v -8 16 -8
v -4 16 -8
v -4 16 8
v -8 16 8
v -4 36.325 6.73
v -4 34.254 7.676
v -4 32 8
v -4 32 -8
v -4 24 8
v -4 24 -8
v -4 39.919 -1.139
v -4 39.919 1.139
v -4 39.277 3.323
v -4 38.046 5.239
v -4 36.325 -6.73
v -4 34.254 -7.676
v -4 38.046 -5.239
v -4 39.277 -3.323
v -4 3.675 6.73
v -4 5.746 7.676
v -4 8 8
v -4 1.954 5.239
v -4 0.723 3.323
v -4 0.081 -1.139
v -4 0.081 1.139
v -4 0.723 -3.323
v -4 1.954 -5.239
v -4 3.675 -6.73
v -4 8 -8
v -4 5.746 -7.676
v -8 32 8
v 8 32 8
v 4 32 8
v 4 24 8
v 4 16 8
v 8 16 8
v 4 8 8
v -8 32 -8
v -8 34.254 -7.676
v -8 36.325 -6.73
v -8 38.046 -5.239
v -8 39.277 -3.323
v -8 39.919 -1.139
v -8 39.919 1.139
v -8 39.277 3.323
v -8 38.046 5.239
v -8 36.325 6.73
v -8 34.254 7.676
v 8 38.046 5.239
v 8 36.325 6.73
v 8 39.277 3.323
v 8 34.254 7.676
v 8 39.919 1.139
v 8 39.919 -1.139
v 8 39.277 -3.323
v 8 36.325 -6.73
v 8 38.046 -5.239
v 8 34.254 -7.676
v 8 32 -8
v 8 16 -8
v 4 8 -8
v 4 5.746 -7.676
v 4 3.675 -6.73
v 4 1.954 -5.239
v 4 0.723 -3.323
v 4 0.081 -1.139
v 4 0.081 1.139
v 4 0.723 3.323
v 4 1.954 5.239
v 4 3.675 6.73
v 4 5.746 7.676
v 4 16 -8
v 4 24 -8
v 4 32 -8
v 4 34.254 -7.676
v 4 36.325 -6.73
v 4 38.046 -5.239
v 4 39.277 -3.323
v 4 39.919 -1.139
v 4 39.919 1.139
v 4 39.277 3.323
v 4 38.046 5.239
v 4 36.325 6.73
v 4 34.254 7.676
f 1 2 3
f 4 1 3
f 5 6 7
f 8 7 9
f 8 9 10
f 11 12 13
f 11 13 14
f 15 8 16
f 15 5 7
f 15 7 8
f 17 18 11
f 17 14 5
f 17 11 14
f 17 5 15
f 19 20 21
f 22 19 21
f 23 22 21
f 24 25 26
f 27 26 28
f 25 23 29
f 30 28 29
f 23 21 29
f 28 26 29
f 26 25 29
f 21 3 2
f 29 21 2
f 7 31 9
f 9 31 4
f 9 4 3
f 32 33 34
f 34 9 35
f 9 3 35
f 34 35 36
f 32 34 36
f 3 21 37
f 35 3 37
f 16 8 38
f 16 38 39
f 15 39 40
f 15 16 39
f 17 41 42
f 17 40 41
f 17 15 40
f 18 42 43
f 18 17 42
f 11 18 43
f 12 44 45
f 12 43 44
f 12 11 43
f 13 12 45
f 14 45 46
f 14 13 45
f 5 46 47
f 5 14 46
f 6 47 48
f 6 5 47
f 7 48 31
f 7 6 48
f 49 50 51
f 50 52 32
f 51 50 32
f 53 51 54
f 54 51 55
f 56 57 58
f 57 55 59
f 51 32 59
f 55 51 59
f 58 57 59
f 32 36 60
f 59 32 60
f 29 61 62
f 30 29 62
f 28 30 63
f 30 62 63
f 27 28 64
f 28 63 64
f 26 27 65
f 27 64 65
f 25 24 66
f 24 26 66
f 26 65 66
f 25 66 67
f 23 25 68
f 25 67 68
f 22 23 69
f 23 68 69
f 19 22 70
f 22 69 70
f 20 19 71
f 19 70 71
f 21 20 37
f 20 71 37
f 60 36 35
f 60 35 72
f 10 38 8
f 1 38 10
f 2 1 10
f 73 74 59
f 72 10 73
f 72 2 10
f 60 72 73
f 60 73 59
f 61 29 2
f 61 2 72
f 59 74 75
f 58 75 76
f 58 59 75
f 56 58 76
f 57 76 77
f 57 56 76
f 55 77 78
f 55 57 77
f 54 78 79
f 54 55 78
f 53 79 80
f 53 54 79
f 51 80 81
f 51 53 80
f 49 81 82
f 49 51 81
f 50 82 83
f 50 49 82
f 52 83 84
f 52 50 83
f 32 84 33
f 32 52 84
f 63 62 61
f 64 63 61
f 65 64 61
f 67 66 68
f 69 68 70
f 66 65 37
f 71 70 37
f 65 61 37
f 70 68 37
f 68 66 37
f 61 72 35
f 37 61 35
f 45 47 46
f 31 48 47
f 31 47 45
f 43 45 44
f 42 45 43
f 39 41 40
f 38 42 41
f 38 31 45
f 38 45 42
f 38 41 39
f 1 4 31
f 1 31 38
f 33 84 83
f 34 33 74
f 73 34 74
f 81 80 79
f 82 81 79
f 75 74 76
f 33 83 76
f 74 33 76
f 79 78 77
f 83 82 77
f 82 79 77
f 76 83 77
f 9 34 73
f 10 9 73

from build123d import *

# Parameters (mm, degrees)
SKETCH_1_W          = 16
SKETCH_1_H          = 16
EXTRUDE_1_DEPTH     = 40
CUT_EXTRUDE_1_DEPTH = 40
CUT_EXTRUDE_START   = -4
CUT_EXTRUDE_2_DEPTH = 4
CUT_EXTRUDE_3_DEPTH = 4
CUT_EXTRUDE_7_DEPTH = 44.8178046
CUT_EXTRUDE_8_DEPTH = 4


with BuildPart() as part:
    # 草图1 → 凸台-拉伸1 (new body)
    with BuildSketch(Plane(origin=(0, 0, 0), x_dir=(1, 0, 0), z_dir=(0, 1, 0))):
        Rectangle(SKETCH_1_W, SKETCH_1_H)
    extrude(amount=EXTRUDE_1_DEPTH)

    # 草图2 → 切除-拉伸1 (cut)
    with BuildSketch(Plane(origin=(8, 0, 0), x_dir=(0, 0, -1), z_dir=(1, 0, 0))):
        with BuildLine():
            Line((-8, 8), (-8, -6.748551072))
            Line((-8, -6.748551072), (8, -6.748551072))
            Line((8, -6.748551072), (8, 8))
            ThreePointArc((8, 8), (0, 0), (-8, 8))
        make_face()
    extrude(amount=-CUT_EXTRUDE_1_DEPTH, mode=Mode.SUBTRACT)

    # 草图4 → 切除-拉伸2 (cut)
    with BuildSketch(Plane.ZY.offset(8).offset(CUT_EXTRUDE_START)):
        with BuildLine():
            Line((-8, 8), (-8, 16))
            Line((-8, 16), (8, 16))
            Line((8, 16), (8, 8))
            ThreePointArc((8, 8), (0, 0), (-8, 8))
        make_face()
    extrude(amount=CUT_EXTRUDE_2_DEPTH, mode=Mode.SUBTRACT)

    # 草图5 → 切除-拉伸3 (cut)
    with BuildSketch(Plane(origin=(8, 0, 0), x_dir=(0, 0, -1), z_dir=(1, 0, 0))):
        with BuildLine():
            Line((-8, 8), (-8, 16))
            Line((-8, 16), (8, 16))
            Line((8, 16), (8, 8))
            ThreePointArc((8, 8), (0, 0), (-8, 8))
        make_face()
    extrude(amount=-CUT_EXTRUDE_3_DEPTH, mode=Mode.SUBTRACT)

    # 草图8 → 切除-拉伸7 (cut, through all)
    with BuildSketch(Plane(origin=(8, 0, 0), x_dir=(0, 0, -1), z_dir=(1, 0, 0))):
        with BuildLine():
            Line((-8, 32), (-8, 44.090265963))
            Line((-8, 44.090265963), (8, 44.090265963))
            Line((8, 44.090265963), (8, 32))
            ThreePointArc((8, 32), (0, 40), (-8, 32))
        make_face()
    extrude(amount=-CUT_EXTRUDE_7_DEPTH, mode=Mode.SUBTRACT)

    # 草图7 → 切除-拉伸8 (cut, symmetric)
    with BuildSketch(Plane(origin=(0, 0, 0), x_dir=(0, 0, -1), z_dir=(1, 0, 0))):
        with BuildLine():
            Line((-8, 32), (-8, 24))
            Line((-8, 24), (8, 24))
            Line((8, 24), (8, 32))
            ThreePointArc((8, 32), (0, 40), (-8, 32))
        make_face()
    extrude(amount=CUT_EXTRUDE_8_DEPTH, both=True, mode=Mode.SUBTRACT)


solid = part.part
